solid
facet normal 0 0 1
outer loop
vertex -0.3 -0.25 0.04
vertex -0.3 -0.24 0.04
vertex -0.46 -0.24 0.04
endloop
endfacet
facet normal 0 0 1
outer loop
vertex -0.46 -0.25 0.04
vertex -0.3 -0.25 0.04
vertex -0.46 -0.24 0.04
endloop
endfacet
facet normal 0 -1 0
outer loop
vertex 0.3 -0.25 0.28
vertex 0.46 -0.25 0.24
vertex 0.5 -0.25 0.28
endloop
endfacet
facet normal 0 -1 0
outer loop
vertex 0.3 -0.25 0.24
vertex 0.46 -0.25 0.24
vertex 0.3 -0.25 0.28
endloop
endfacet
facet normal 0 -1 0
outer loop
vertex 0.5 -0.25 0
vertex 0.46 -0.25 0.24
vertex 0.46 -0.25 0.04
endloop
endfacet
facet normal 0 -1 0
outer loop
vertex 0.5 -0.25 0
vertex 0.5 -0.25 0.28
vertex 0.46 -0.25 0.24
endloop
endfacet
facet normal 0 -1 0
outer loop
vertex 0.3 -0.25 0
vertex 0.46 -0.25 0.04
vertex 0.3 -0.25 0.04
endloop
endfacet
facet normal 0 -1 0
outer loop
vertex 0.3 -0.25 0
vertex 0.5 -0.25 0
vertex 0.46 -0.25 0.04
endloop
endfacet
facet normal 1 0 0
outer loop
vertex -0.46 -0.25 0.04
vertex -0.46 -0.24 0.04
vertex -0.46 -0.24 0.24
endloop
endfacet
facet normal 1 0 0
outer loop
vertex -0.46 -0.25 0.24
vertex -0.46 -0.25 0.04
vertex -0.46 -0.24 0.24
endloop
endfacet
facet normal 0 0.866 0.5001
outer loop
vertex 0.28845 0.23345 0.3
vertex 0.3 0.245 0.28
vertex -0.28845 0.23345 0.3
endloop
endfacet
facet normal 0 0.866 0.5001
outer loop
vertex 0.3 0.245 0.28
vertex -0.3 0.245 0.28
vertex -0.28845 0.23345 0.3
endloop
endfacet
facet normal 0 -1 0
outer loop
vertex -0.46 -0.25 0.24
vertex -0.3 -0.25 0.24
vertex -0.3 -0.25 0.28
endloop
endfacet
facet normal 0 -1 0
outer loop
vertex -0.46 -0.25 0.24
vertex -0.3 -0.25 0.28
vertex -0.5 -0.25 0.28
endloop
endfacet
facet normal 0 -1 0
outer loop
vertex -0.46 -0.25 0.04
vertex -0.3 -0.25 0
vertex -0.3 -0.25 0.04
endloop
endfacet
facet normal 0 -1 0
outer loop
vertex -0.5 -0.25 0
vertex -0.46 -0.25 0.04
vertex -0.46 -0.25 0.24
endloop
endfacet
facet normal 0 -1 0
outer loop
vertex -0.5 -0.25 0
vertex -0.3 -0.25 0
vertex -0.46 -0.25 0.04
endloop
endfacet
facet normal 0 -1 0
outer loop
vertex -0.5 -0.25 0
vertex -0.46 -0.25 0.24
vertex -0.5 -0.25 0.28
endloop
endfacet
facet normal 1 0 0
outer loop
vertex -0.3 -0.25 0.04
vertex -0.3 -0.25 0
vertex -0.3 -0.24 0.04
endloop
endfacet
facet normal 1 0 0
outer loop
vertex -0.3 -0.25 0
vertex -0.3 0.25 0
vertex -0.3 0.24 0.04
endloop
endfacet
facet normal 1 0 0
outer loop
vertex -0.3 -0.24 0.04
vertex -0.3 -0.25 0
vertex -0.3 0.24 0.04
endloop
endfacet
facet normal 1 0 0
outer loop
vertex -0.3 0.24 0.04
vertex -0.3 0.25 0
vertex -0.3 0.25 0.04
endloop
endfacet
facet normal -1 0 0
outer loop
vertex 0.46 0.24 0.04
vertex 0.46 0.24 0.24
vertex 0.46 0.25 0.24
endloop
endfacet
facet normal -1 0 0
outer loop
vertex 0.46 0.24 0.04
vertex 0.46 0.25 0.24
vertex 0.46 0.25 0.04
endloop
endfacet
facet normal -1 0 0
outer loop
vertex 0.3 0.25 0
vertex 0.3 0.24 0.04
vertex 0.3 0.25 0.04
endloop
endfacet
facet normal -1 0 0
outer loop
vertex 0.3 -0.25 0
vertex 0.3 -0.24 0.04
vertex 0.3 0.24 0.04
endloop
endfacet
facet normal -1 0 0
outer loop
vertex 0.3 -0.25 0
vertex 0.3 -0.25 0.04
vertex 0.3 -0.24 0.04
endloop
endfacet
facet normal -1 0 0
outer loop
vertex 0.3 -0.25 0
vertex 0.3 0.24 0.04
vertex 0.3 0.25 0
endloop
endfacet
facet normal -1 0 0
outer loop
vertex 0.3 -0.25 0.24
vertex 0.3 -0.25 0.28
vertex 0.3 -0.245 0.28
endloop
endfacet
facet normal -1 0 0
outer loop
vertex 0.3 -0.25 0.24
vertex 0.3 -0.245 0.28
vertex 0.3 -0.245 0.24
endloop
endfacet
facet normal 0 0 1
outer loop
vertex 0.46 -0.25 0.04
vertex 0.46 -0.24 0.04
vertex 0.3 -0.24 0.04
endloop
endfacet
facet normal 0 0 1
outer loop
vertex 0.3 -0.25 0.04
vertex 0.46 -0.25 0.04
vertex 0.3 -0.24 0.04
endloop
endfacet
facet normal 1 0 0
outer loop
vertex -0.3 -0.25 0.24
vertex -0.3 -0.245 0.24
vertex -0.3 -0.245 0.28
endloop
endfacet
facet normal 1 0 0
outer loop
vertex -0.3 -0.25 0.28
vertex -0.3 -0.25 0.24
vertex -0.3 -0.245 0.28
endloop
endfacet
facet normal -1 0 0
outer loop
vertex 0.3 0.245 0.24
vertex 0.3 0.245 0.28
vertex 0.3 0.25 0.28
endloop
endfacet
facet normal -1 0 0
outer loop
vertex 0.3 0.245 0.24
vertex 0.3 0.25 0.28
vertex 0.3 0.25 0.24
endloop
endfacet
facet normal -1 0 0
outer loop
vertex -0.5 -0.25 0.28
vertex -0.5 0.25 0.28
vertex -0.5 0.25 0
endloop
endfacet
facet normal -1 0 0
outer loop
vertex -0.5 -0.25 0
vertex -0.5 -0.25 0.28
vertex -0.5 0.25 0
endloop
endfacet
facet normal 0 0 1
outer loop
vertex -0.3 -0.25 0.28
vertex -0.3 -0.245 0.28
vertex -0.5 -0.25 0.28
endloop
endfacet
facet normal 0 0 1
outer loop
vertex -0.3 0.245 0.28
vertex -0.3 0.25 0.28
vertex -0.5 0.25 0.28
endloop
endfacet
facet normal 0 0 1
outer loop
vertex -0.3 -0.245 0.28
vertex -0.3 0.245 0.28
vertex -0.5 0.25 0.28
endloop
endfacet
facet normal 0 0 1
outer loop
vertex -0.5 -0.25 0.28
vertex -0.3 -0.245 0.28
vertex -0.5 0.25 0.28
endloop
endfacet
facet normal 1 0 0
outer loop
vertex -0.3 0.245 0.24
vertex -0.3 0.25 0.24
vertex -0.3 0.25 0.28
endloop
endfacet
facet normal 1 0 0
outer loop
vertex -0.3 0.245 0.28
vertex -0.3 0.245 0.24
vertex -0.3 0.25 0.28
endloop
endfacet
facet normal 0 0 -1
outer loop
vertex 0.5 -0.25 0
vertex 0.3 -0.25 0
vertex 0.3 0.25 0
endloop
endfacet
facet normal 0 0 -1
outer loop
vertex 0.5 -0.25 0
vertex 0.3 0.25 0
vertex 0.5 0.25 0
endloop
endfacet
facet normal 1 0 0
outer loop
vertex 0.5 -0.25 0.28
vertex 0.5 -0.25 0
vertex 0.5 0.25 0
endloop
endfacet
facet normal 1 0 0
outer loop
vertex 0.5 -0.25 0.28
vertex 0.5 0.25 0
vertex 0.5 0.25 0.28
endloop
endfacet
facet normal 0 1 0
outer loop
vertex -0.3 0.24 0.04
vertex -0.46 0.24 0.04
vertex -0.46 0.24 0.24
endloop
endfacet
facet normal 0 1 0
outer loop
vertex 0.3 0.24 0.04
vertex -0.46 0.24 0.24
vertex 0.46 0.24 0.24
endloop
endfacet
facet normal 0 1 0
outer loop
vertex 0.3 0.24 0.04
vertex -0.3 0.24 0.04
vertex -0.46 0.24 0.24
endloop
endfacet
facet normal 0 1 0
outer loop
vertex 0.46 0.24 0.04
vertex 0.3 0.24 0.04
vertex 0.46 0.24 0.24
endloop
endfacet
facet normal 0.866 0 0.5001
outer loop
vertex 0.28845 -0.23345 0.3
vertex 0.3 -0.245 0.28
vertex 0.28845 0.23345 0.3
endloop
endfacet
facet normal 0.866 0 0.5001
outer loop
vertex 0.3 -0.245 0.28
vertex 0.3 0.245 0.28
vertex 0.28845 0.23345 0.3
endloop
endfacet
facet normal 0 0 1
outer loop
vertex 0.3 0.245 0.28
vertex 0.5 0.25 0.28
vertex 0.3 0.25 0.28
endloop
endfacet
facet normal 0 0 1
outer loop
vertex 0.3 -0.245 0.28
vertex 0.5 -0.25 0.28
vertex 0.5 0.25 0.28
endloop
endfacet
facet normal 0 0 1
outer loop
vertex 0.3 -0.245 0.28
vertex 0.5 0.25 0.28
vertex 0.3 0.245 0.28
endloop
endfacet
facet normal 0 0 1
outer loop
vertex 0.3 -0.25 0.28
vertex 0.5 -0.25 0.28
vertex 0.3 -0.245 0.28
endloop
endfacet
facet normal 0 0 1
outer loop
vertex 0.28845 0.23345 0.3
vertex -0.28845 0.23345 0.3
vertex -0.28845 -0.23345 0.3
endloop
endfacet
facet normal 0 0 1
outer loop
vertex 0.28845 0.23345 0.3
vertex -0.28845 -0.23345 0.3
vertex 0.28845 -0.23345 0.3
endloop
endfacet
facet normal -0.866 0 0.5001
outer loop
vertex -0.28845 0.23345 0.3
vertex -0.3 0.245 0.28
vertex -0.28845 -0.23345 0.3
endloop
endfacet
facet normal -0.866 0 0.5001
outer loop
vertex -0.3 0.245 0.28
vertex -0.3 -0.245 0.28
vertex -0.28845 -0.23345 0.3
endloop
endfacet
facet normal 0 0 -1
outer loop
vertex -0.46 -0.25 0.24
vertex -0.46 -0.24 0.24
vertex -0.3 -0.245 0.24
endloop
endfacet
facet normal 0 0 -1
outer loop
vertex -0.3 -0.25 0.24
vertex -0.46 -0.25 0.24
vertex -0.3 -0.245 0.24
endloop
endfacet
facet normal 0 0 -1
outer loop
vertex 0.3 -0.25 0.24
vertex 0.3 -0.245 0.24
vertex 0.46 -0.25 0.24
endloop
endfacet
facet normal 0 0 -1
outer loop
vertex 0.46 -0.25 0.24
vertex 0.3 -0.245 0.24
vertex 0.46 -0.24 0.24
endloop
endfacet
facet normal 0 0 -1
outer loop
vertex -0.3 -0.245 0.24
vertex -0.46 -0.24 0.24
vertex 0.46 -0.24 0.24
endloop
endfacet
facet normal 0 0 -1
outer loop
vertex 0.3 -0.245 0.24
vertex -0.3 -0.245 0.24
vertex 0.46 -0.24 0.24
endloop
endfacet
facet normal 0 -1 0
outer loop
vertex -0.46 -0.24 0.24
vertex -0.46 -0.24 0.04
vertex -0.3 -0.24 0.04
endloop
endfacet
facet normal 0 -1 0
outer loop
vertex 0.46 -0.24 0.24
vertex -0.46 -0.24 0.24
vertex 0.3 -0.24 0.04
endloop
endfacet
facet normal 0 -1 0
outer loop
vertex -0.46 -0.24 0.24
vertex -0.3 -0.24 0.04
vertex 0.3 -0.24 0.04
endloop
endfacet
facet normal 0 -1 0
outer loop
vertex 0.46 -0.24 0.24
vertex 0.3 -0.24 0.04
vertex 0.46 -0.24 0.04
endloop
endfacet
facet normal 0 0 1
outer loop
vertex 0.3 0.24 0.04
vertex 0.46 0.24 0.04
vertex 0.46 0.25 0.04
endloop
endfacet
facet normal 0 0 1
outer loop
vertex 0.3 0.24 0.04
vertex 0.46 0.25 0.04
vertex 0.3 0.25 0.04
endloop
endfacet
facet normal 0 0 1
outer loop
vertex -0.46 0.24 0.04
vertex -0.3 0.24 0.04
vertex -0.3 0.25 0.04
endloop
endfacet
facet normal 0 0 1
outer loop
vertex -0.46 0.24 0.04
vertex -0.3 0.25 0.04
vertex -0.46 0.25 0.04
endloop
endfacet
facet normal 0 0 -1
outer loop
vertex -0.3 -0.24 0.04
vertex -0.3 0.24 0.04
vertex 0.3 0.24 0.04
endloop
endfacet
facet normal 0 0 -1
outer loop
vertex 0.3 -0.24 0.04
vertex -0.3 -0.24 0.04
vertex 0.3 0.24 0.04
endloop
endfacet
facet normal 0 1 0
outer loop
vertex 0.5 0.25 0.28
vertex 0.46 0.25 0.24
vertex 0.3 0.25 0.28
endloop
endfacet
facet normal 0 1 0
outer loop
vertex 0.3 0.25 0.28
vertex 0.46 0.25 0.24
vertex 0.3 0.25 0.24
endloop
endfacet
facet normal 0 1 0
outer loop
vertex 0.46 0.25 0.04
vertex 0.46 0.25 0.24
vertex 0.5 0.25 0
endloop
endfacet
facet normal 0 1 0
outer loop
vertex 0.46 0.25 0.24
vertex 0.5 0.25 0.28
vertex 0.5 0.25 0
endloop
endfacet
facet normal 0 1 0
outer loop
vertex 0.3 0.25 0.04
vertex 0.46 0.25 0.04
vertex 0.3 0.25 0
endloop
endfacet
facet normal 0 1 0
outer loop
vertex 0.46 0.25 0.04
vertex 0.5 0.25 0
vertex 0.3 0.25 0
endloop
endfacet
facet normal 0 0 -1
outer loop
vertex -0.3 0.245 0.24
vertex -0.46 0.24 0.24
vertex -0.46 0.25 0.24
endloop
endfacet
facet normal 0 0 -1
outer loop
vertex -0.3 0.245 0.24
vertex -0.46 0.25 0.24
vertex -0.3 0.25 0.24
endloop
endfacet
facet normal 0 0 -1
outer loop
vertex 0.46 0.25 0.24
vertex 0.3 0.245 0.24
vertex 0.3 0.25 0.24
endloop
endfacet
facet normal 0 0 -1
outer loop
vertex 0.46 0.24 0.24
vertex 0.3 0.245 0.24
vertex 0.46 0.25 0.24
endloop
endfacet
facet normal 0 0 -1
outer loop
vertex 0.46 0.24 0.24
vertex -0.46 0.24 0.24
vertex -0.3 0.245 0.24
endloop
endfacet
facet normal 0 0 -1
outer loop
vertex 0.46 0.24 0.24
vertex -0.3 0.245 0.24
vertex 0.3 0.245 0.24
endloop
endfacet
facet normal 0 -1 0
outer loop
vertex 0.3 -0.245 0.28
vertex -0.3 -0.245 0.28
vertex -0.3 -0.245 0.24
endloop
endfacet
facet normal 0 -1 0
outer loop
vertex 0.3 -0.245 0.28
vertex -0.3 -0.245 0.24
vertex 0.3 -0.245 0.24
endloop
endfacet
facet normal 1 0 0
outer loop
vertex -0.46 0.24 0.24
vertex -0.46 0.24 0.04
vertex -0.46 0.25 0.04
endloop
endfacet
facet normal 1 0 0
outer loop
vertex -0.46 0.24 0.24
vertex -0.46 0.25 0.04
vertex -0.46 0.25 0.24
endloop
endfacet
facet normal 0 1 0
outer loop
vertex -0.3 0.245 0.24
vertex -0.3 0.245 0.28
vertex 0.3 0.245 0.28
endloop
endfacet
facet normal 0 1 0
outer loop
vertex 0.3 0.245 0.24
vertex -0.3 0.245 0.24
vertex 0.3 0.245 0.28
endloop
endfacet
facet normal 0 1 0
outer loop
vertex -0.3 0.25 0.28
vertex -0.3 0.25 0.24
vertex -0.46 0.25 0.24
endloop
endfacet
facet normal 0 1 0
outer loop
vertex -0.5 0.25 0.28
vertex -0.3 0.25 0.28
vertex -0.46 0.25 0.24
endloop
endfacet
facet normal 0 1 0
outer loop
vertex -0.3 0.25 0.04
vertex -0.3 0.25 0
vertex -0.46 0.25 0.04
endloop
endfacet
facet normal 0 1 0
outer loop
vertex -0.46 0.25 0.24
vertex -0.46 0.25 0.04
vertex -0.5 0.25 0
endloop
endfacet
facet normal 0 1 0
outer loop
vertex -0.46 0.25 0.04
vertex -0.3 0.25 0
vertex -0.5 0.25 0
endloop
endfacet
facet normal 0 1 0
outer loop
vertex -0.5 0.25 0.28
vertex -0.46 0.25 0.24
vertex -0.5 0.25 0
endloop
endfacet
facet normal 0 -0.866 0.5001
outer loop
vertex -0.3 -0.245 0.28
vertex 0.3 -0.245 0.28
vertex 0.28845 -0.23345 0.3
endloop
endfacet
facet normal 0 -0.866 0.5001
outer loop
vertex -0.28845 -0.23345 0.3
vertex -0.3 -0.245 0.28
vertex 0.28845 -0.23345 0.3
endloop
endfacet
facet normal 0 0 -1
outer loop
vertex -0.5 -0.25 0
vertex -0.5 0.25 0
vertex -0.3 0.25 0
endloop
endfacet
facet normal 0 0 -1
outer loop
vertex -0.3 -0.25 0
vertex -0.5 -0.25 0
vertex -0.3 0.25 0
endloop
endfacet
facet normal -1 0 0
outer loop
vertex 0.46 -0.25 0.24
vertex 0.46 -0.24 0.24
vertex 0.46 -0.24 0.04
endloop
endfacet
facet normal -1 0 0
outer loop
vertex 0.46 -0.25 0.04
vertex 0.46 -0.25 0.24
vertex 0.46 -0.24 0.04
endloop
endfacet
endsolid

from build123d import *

# Parameters (mm, degrees)
EXTRUDE_START             = 0.04
SKETCH_2_W                = 0.92
SKETCH_2_H                = 0.48
EXTRUDE_2_DEPTH           = 0.2
EXTRUDE_4_DEPTH           = 0.25
EXTRUDE_4_DEPTH_BACK      = 0.25
EXTRUDE_START_2           = 0.28
SKETCH_6_W                = 0.6
SKETCH_6_H                = 0.49
EXTRUDE_6_DEPTH           = 0.02
EXTRUDE_6_TAPER           = 30
EXTRUDE_6_OTHER_WAY_DEPTH = 0.04


with BuildPart() as part:
    # Эскиз2 → Вытянуть2 (new body)
    with BuildSketch(Plane.XY.offset(EXTRUDE_START)):
        Rectangle(SKETCH_2_W, SKETCH_2_H)
    extrude(amount=EXTRUDE_2_DEPTH)

    # Эскиз4 → Вытянуть4 (add, two sides)
    with BuildSketch(Plane(origin=(0, 0, 0), x_dir=(1, 0, 0), z_dir=(0, 1, 0))) as extrude_4_sk:
        Polygon((-0.5, 0), (-0.3, 0), (-0.3, -0.04), (-0.46, -0.04), (-0.46, -0.24), (-0.3, -0.24), (-0.3, -0.28), (-0.5, -0.28), align=None)
        Polygon((0.3, -0.24), (0.46, -0.24), (0.46, -0.04), (0.3, -0.04), (0.3, 0), (0.5, 0), (0.5, -0.28), (0.3, -0.28), align=None)
    extrude(amount=EXTRUDE_4_DEPTH)
    extrude(extrude_4_sk.sketch, amount=-EXTRUDE_4_DEPTH_BACK)

    # Эскиз6 → Вытянуть6 (add)
    with BuildSketch(Plane.XY.offset(EXTRUDE_START_2)):
        Rectangle(SKETCH_6_W, SKETCH_6_H)
    extrude(amount=EXTRUDE_6_DEPTH, taper=EXTRUDE_6_TAPER)

    # Эскиз6 → Вытянуть6 other way (add)
    with BuildSketch(Plane.XY.offset(EXTRUDE_START_2)):
        Rectangle(SKETCH_6_W, SKETCH_6_H)
    extrude(amount=-EXTRUDE_6_OTHER_WAY_DEPTH)


solid = part.part
